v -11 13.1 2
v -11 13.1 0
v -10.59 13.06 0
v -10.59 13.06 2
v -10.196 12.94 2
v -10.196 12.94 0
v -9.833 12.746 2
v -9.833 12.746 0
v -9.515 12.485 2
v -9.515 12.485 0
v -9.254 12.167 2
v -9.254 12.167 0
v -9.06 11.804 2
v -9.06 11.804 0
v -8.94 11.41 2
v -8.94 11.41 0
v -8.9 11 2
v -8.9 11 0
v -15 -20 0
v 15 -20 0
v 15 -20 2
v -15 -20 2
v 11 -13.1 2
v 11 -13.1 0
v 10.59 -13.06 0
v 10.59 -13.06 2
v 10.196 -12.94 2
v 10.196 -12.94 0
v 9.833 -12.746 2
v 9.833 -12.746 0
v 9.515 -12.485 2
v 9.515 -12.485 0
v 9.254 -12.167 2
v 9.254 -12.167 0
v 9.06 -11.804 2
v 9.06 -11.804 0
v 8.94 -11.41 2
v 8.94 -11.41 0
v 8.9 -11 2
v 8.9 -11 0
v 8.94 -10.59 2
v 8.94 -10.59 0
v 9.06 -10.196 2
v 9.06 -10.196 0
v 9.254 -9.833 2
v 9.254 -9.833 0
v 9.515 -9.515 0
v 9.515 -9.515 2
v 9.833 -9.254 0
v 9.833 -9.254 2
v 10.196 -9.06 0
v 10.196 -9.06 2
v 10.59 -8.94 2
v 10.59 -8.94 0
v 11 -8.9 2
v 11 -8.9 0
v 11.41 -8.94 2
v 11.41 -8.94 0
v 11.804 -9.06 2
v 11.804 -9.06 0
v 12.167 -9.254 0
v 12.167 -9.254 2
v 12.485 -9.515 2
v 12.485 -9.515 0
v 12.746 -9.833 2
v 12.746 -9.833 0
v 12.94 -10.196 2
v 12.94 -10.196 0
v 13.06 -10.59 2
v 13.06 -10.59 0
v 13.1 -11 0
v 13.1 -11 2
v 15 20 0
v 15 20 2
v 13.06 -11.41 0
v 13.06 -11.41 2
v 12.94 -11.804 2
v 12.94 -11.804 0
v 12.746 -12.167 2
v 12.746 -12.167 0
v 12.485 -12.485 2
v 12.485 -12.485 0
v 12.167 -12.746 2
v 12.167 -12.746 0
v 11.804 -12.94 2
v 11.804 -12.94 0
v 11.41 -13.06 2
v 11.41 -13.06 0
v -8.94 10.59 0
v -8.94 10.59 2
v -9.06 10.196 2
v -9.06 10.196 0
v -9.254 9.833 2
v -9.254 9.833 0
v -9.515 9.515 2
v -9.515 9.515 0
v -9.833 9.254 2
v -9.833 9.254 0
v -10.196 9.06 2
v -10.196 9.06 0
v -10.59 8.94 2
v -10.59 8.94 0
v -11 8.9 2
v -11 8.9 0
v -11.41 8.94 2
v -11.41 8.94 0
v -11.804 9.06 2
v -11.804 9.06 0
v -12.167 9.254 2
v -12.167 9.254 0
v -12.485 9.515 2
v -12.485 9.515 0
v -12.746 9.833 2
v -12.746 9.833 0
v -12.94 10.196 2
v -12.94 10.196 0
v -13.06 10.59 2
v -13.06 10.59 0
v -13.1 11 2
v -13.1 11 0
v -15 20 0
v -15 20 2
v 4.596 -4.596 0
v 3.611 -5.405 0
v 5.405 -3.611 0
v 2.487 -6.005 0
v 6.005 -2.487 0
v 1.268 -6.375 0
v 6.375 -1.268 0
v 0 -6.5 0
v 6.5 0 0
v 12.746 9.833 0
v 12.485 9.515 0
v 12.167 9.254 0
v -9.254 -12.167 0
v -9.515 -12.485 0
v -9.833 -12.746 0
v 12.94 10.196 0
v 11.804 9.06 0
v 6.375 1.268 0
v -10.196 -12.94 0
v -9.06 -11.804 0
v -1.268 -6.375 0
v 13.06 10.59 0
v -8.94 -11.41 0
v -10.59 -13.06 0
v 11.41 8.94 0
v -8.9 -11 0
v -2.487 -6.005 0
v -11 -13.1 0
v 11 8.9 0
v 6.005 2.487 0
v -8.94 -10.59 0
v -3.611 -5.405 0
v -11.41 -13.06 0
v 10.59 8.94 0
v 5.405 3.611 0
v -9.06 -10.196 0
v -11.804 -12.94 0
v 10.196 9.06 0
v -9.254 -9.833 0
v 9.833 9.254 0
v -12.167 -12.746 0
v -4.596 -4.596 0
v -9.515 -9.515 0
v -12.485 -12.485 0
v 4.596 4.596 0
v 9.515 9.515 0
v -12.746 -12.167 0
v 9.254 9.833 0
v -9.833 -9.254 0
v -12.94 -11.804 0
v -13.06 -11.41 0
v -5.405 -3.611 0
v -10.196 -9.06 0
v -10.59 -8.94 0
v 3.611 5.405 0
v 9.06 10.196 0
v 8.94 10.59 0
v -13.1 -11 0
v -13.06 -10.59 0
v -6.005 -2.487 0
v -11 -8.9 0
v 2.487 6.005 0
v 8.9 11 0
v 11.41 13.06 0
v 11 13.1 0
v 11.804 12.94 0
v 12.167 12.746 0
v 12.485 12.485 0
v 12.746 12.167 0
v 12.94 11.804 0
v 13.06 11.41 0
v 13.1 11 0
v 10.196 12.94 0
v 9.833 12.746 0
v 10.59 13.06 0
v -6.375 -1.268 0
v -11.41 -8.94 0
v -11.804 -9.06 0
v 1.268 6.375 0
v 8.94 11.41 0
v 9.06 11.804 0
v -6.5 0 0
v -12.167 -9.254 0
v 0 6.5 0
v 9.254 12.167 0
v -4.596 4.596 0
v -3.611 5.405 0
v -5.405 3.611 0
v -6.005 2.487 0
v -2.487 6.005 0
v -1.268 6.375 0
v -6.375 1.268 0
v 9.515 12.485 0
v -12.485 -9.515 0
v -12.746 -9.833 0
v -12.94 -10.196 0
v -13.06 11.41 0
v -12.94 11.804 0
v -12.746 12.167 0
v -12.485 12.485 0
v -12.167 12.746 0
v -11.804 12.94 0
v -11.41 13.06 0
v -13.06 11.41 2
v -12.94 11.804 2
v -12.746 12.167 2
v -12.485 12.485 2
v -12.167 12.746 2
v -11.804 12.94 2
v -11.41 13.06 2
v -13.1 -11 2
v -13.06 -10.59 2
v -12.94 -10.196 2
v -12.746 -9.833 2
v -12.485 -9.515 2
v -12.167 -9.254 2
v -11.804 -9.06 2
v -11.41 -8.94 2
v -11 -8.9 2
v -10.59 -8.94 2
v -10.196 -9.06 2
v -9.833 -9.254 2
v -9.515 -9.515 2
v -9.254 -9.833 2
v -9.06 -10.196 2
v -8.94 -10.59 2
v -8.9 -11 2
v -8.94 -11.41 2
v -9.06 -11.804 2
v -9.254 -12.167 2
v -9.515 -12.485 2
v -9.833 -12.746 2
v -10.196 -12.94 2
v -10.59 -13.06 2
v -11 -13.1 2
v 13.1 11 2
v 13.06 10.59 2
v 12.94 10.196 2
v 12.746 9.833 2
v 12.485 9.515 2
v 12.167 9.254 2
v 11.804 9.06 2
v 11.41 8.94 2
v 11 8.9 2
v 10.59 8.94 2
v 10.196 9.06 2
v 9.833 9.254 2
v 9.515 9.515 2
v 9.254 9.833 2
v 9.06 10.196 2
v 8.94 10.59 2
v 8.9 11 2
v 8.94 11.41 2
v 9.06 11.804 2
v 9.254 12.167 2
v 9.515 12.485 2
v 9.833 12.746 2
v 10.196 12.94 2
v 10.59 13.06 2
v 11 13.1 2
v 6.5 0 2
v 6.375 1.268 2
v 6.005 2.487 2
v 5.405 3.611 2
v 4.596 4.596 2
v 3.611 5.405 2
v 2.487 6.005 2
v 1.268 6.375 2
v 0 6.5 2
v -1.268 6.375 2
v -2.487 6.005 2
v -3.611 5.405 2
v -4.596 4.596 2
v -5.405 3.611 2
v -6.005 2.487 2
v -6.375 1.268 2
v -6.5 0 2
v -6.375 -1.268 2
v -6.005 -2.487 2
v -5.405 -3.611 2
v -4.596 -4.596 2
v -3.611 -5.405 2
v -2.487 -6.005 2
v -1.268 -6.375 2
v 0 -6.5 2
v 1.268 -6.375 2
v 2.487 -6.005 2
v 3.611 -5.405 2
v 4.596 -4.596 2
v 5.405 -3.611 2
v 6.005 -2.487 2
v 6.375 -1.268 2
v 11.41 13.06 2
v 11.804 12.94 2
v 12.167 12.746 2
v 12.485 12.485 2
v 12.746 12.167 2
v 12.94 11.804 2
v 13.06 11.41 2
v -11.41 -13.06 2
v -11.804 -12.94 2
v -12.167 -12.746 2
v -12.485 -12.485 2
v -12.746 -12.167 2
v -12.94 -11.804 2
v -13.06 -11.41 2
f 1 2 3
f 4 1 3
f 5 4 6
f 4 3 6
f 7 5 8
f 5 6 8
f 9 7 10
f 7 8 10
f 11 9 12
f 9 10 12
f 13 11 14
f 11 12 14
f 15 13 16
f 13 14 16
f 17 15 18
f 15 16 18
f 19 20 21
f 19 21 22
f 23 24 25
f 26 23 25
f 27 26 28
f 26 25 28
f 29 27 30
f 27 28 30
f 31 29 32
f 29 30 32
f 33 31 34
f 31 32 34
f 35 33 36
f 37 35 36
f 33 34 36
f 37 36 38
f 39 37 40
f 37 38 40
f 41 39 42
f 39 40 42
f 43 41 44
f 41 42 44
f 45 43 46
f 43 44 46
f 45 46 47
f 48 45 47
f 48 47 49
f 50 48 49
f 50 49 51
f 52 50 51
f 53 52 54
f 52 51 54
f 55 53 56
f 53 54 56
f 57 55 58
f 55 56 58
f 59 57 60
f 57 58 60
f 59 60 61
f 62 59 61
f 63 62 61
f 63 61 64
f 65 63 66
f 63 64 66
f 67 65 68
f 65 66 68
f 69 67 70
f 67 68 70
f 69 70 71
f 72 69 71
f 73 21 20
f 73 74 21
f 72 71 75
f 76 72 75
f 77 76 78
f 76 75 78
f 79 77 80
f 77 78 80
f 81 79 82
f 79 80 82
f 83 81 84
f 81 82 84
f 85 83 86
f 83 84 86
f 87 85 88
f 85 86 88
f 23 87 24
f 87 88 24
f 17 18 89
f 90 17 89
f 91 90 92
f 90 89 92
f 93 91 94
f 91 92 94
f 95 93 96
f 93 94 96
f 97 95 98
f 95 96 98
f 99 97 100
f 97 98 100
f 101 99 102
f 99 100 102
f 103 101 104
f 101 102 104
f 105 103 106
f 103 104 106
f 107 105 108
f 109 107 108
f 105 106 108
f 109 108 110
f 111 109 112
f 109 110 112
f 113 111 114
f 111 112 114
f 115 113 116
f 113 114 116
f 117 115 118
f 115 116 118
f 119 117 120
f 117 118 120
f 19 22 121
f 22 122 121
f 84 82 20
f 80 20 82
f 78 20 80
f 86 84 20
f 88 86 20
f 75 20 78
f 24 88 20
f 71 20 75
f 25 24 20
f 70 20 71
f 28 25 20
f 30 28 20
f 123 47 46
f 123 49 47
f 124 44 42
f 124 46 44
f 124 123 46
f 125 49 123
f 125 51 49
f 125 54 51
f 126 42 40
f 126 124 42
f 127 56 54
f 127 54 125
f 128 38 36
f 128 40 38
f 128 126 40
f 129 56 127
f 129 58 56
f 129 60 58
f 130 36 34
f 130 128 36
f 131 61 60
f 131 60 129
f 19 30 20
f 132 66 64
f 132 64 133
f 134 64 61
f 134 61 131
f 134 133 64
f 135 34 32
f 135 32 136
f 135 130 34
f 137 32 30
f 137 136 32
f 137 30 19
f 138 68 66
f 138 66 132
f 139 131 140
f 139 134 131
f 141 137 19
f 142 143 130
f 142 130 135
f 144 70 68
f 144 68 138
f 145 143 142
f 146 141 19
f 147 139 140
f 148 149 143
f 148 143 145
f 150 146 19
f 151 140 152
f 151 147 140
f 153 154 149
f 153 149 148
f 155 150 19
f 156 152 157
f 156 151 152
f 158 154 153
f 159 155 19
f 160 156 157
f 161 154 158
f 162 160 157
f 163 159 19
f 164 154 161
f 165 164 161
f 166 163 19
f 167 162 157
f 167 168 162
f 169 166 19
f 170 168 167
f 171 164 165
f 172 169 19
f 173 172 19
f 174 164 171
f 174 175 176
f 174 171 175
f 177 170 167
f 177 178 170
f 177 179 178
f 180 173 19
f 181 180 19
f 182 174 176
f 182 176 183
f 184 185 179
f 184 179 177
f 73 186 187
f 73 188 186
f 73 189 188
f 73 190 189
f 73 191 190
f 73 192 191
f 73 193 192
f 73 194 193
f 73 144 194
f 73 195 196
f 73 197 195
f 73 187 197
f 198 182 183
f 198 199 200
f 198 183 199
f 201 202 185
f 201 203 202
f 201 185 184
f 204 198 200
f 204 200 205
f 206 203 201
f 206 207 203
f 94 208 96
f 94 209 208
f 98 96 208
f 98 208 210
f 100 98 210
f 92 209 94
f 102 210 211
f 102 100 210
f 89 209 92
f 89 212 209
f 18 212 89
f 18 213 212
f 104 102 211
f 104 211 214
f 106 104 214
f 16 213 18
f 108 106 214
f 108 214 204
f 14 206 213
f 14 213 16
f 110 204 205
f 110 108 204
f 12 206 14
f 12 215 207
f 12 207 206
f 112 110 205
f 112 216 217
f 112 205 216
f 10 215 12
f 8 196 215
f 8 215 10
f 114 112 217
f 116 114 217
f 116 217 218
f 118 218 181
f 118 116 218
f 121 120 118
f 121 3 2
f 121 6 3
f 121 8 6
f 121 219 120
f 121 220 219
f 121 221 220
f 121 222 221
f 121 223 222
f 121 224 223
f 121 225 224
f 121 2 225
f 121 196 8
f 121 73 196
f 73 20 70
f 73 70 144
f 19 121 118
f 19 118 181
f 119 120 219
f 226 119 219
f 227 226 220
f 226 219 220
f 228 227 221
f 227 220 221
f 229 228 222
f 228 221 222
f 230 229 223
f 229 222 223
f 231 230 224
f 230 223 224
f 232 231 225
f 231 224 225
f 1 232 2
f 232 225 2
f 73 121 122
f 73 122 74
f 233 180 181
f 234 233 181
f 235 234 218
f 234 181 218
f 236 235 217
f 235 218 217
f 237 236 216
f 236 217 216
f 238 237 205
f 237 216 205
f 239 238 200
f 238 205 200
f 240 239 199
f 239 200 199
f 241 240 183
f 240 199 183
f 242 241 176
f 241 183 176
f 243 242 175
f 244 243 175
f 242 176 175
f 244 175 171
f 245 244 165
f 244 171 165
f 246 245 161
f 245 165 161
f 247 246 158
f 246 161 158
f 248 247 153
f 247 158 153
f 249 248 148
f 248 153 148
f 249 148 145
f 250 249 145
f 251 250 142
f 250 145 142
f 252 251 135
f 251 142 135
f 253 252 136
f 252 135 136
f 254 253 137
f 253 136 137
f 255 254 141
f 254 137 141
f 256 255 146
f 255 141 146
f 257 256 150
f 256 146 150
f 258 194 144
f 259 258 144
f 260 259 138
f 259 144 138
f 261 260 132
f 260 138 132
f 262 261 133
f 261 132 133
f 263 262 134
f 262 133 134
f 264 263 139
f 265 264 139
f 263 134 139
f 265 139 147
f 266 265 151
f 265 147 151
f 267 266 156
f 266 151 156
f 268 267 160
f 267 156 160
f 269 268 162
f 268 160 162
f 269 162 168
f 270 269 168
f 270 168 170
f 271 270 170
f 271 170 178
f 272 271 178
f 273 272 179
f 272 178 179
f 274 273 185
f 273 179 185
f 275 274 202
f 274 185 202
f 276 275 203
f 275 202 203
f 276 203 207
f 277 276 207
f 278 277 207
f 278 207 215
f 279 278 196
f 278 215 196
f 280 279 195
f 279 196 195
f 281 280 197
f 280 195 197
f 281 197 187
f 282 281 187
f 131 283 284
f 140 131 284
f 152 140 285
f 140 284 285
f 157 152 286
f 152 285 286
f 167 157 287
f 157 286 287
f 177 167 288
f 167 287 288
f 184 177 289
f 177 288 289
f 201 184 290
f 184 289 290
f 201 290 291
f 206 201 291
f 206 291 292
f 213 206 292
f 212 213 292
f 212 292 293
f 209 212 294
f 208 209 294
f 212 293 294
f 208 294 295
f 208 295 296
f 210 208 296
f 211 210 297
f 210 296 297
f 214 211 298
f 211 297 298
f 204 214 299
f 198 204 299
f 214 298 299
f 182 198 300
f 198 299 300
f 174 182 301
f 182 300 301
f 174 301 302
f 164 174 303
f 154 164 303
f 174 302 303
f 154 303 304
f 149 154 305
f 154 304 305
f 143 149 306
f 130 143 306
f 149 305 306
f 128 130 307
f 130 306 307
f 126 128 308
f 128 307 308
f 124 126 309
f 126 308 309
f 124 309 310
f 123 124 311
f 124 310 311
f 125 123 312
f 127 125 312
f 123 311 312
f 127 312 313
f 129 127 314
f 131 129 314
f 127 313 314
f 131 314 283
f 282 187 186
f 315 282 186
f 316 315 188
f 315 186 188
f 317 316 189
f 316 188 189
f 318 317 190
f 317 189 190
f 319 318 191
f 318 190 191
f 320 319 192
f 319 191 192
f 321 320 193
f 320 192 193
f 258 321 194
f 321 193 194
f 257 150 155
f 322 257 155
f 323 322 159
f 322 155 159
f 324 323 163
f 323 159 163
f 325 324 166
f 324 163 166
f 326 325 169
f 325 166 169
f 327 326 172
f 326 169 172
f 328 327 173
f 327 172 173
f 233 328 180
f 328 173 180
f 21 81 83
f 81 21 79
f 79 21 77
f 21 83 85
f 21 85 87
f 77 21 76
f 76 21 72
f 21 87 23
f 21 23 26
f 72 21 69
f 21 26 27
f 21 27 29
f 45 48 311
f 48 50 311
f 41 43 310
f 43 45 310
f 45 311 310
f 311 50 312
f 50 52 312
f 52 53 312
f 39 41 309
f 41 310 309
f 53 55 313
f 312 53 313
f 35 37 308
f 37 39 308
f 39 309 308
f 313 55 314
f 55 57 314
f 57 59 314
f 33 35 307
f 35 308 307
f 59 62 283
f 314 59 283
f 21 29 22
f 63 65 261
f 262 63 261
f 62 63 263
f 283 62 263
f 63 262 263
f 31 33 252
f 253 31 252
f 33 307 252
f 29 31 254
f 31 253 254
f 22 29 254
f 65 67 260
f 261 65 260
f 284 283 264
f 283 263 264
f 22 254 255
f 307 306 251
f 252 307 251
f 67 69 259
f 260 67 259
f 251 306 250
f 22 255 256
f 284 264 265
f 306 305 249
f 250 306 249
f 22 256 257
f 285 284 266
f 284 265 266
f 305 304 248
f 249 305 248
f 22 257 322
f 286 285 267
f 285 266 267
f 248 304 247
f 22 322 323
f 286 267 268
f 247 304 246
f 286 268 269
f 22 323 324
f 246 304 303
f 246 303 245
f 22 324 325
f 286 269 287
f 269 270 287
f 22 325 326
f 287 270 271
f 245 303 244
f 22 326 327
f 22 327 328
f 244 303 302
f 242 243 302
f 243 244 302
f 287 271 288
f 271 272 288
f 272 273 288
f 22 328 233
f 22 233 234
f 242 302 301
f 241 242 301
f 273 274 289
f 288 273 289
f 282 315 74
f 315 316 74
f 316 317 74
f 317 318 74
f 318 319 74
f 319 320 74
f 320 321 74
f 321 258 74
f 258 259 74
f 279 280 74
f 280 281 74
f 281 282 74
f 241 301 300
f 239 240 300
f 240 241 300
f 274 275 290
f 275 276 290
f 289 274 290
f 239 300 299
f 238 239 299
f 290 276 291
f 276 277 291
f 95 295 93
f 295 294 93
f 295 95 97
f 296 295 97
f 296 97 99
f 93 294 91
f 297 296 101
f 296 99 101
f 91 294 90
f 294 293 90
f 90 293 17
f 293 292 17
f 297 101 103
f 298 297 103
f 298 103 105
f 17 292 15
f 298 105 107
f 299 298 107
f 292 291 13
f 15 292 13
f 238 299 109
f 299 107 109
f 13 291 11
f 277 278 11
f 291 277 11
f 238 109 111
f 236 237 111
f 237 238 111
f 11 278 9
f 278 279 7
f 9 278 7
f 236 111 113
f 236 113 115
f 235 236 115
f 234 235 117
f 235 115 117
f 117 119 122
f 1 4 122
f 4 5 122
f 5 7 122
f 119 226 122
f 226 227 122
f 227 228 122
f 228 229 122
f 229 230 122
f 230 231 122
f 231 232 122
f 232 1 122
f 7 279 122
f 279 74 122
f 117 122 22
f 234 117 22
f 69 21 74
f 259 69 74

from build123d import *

# Parameters (mm, degrees)
EXTRUDE_1_DEPTH     = 2
SKETCH_2_R          = 6.5
CUT_EXTRUDE_1_DEPTH = 2
SKETCH_5_W          = 30
SKETCH_5_H          = 2
EXTRUDE_4_DEPTH     = 5
SKETCH_6_W          = 30
SKETCH_6_H          = 2
EXTRUDE_5_DEPTH     = 5


with BuildPart() as part:
    # ｽｹｯﾁ1 → ﾎﾞｽ - 押し出し1 (new body)
    with BuildSketch(Plane.XY):
        with BuildLine():
            Line((11, 15), (-11, 15))
            Line((-11, 15), (-11, 13.1))
            ThreePointArc((-11, 13.1), (-9.51507576, 12.48492424), (-8.9, 11))
            ThreePointArc((-8.9, 11), (-11, 8.9), (-13.1, 11))
            Line((-13.1, 11), (-15, 11))
            Line((-15, 11), (-15, -11))
            Line((-15, -11), (-13.1, -11))
            ThreePointArc((-13.1, -11), (-11, -8.9), (-8.9, -11))
            ThreePointArc((-8.9, -11), (-9.51507576, -12.48492424), (-11, -13.1))
            Line((-11, -13.1), (-11, -15))
            Line((-11, -15), (11, -15))
            Line((11, -15), (11, -13.1))
            ThreePointArc((11, -13.1), (9.51507576, -9.51507576), (13.1, -11))
            Line((13.1, -11), (15, -11))
            Line((15, -11), (15, 11))
            Line((15, 11), (13.1, 11))
            ThreePointArc((13.1, 11), (9.51507576, 9.51507576), (11, 13.1))
            Line((11, 13.1), (11, 15))
        make_face()
        with BuildLine():
            Line((15, -15), (15, -11))
            Line((15, -11), (13.1, -11))
            ThreePointArc((13.1, -11), (12.48492424, -12.48492424), (11, -13.1))
            Line((11, -13.1), (11, -15))
            Line((11, -15), (15, -15))
        make_face()
        with BuildLine():
            Line((-13.1, -11), (-15, -11))
            Line((-15, -11), (-15, -15))
            Line((-15, -15), (-11, -15))
            Line((-11, -15), (-11, -13.1))
            ThreePointArc((-11, -13.1), (-12.48492424, -12.48492424), (-13.1, -11))
        make_face()
        with BuildLine():
            Line((-11, 15), (-15, 15))
            Line((-15, 15), (-15, 11))
            Line((-15, 11), (-13.1, 11))
            ThreePointArc((-13.1, 11), (-12.48492424, 12.48492424), (-11, 13.1))
            Line((-11, 13.1), (-11, 15))
        make_face()
        with BuildLine():
            Line((15, 15), (11, 15))
            Line((11, 15), (11, 13.1))
            ThreePointArc((11, 13.1), (12.48492424, 12.48492424), (13.1, 11))
            Line((13.1, 11), (15, 11))
            Line((15, 11), (15, 15))
        make_face()
    extrude(amount=EXTRUDE_1_DEPTH)

    # ｽｹｯﾁ2 → ｶｯﾄ - 押し出し1 (cut)
    with BuildSketch(Plane.XY.offset(2)):
        Circle(SKETCH_2_R)
    extrude(amount=-CUT_EXTRUDE_1_DEPTH, mode=Mode.SUBTRACT)

    # ｽｹｯﾁ5 → ﾎﾞｽ - 押し出し4 (add)
    with BuildSketch(Plane(origin=(0, 15, 0), x_dir=(1, 0, 0), z_dir=(0, 1, 0))):
        with Locations((0, -1)):
            Rectangle(SKETCH_5_W, SKETCH_5_H)
    extrude(amount=EXTRUDE_4_DEPTH)

    # ｽｹｯﾁ6 → ﾎﾞｽ - 押し出し5 (add)
    with BuildSketch(Plane(origin=(0, -15, 0), x_dir=(-1, 0, 0), z_dir=(0, -1, 0))):
        with Locations((0, -1)):
            Rectangle(SKETCH_6_W, SKETCH_6_H)
    extrude(amount=EXTRUDE_5_DEPTH)


solid = part.part
